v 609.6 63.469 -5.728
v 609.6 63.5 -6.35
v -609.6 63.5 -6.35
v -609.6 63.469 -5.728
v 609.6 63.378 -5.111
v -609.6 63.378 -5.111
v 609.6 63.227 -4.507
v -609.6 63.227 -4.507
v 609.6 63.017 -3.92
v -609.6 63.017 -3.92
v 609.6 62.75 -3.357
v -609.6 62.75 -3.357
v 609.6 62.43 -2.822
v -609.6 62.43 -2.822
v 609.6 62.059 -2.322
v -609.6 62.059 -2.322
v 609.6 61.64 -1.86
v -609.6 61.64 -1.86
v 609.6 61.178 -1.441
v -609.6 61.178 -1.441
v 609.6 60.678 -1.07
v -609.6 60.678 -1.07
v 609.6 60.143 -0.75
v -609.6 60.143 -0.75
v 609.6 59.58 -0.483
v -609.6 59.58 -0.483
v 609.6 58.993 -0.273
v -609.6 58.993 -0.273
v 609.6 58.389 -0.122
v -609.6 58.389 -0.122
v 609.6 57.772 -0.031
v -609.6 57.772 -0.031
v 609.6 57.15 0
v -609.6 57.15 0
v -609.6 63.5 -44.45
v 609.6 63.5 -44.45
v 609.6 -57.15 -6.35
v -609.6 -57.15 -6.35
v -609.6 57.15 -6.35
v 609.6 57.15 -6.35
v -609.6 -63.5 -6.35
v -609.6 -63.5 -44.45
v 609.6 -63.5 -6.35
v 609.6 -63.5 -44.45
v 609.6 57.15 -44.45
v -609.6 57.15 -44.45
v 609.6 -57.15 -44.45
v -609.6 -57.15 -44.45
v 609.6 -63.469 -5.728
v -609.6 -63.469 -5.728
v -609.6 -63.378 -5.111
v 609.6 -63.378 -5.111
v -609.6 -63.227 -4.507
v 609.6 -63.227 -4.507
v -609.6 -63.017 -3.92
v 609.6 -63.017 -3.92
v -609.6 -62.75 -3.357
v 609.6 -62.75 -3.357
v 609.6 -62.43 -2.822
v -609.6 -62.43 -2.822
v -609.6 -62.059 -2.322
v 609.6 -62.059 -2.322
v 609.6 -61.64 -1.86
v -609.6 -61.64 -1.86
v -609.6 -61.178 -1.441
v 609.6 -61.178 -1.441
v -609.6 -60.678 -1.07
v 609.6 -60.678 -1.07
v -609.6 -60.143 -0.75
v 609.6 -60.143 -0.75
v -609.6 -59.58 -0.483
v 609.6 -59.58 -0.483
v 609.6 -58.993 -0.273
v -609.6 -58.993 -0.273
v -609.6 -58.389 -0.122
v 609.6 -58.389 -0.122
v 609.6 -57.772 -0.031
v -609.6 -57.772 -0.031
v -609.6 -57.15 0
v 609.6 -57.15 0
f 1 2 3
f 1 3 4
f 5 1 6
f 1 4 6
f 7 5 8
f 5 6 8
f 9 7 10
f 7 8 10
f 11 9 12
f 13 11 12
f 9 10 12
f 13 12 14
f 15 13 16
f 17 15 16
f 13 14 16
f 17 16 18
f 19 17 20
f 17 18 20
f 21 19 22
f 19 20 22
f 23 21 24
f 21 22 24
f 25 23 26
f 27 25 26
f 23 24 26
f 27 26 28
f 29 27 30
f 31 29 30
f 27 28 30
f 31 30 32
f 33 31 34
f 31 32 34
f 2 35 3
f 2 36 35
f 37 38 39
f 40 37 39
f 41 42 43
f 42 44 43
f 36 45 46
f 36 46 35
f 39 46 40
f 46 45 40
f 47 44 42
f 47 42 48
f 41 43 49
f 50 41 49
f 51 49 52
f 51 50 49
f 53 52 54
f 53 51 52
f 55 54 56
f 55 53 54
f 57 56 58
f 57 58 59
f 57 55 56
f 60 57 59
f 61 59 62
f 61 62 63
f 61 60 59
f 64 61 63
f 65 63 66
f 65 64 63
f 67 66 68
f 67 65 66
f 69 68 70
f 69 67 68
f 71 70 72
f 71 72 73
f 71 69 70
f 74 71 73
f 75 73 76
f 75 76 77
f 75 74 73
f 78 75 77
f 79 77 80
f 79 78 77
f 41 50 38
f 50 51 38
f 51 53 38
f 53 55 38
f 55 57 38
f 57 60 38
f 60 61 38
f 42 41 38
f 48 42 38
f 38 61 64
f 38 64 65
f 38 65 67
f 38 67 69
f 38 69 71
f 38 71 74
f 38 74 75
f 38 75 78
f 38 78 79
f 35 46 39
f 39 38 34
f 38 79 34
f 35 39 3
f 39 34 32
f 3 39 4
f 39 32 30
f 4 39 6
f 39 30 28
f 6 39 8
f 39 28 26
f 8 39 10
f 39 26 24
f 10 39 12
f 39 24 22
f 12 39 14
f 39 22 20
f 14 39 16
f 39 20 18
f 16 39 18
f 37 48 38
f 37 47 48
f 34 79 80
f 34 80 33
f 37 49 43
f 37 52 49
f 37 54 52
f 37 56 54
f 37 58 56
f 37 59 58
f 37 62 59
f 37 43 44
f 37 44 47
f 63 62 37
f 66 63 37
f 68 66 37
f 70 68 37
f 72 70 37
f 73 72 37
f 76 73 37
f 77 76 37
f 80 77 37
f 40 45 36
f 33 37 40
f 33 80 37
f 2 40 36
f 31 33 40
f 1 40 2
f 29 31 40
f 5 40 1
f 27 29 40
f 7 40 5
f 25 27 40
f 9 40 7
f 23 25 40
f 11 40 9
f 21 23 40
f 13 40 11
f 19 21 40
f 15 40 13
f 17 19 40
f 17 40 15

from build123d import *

# Parameters (mm, degrees)
F0_W     = 127
F0_H     = 44.45
F1_DEPTH = 609.6
F2_R     = 6.35
F3_T     = 6.35


# Not quite as in the source:
# - a shell that OpenCascade refuses in one call is made with other operations: the cavity is built on its own and cut out


with BuildPart() as f1:
    # F0 (on Right) → F1 (new body, symmetric)
    with BuildSketch(Plane.YZ):
        with Locations((0, -22.225)):
            Rectangle(F0_W, F0_H)
    extrude(amount=F1_DEPTH, both=True)

    # F2
    f2_edges = [f1.edges().sort_by_distance(p)[0] for p in [
        (0, -63.5, 0),
        (0, 63.5, 0),
    ]]
    fillet(f2_edges, radius=F2_R)

    # F3: shell of thickness 6.35, made by hand


with BuildPart() as f3_core1:
    # F3_t2: copy of F1
    add(f1.part)

    # the walls: a layer under each face that stays
    f3_faces = [f3_core1.faces().sort_by_distance(p)[0] for p in [
        (0, 0, 0),
        (0, 63.5, -25.4),
        (0, -63.5, -25.4),
    ]]
    thicken(f3_faces, amount=-F3_T, mode=Mode.SUBTRACT)


with BuildPart() as f1_1:
    add(f1.part)

    # what is left inside the walls is the cavity
    f3_cavity = [f3_core1.part.solids().sort_by_distance(p)[0] for p in [
        (-203.2, 0, -44.3865),
    ]]
    add(f3_cavity, mode=Mode.SUBTRACT)


solid = f1_1.part
